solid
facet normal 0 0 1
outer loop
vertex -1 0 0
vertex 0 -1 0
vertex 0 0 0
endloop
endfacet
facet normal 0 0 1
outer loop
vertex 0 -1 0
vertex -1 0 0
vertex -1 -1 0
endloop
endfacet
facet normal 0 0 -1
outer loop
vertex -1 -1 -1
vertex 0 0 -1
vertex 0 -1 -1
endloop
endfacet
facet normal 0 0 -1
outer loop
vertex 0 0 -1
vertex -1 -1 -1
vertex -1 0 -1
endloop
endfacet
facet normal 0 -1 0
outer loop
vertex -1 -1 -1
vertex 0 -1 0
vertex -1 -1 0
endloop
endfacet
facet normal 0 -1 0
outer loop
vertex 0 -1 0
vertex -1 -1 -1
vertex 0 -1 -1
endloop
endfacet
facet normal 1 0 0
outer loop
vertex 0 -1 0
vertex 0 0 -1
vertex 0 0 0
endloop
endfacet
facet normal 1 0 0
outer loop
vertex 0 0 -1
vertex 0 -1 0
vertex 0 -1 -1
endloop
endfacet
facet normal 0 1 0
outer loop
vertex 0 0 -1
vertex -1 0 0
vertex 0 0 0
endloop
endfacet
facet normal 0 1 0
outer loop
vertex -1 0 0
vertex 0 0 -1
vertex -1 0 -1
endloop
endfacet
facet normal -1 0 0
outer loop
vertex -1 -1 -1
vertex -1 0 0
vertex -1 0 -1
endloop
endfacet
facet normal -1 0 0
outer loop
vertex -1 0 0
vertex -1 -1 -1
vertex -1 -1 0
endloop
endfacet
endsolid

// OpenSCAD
$fa=4; $fs=0.4;
color("#000") translate([-1.000,-1.000,-1.000]) cube([1.000,1.000,1.000]);
